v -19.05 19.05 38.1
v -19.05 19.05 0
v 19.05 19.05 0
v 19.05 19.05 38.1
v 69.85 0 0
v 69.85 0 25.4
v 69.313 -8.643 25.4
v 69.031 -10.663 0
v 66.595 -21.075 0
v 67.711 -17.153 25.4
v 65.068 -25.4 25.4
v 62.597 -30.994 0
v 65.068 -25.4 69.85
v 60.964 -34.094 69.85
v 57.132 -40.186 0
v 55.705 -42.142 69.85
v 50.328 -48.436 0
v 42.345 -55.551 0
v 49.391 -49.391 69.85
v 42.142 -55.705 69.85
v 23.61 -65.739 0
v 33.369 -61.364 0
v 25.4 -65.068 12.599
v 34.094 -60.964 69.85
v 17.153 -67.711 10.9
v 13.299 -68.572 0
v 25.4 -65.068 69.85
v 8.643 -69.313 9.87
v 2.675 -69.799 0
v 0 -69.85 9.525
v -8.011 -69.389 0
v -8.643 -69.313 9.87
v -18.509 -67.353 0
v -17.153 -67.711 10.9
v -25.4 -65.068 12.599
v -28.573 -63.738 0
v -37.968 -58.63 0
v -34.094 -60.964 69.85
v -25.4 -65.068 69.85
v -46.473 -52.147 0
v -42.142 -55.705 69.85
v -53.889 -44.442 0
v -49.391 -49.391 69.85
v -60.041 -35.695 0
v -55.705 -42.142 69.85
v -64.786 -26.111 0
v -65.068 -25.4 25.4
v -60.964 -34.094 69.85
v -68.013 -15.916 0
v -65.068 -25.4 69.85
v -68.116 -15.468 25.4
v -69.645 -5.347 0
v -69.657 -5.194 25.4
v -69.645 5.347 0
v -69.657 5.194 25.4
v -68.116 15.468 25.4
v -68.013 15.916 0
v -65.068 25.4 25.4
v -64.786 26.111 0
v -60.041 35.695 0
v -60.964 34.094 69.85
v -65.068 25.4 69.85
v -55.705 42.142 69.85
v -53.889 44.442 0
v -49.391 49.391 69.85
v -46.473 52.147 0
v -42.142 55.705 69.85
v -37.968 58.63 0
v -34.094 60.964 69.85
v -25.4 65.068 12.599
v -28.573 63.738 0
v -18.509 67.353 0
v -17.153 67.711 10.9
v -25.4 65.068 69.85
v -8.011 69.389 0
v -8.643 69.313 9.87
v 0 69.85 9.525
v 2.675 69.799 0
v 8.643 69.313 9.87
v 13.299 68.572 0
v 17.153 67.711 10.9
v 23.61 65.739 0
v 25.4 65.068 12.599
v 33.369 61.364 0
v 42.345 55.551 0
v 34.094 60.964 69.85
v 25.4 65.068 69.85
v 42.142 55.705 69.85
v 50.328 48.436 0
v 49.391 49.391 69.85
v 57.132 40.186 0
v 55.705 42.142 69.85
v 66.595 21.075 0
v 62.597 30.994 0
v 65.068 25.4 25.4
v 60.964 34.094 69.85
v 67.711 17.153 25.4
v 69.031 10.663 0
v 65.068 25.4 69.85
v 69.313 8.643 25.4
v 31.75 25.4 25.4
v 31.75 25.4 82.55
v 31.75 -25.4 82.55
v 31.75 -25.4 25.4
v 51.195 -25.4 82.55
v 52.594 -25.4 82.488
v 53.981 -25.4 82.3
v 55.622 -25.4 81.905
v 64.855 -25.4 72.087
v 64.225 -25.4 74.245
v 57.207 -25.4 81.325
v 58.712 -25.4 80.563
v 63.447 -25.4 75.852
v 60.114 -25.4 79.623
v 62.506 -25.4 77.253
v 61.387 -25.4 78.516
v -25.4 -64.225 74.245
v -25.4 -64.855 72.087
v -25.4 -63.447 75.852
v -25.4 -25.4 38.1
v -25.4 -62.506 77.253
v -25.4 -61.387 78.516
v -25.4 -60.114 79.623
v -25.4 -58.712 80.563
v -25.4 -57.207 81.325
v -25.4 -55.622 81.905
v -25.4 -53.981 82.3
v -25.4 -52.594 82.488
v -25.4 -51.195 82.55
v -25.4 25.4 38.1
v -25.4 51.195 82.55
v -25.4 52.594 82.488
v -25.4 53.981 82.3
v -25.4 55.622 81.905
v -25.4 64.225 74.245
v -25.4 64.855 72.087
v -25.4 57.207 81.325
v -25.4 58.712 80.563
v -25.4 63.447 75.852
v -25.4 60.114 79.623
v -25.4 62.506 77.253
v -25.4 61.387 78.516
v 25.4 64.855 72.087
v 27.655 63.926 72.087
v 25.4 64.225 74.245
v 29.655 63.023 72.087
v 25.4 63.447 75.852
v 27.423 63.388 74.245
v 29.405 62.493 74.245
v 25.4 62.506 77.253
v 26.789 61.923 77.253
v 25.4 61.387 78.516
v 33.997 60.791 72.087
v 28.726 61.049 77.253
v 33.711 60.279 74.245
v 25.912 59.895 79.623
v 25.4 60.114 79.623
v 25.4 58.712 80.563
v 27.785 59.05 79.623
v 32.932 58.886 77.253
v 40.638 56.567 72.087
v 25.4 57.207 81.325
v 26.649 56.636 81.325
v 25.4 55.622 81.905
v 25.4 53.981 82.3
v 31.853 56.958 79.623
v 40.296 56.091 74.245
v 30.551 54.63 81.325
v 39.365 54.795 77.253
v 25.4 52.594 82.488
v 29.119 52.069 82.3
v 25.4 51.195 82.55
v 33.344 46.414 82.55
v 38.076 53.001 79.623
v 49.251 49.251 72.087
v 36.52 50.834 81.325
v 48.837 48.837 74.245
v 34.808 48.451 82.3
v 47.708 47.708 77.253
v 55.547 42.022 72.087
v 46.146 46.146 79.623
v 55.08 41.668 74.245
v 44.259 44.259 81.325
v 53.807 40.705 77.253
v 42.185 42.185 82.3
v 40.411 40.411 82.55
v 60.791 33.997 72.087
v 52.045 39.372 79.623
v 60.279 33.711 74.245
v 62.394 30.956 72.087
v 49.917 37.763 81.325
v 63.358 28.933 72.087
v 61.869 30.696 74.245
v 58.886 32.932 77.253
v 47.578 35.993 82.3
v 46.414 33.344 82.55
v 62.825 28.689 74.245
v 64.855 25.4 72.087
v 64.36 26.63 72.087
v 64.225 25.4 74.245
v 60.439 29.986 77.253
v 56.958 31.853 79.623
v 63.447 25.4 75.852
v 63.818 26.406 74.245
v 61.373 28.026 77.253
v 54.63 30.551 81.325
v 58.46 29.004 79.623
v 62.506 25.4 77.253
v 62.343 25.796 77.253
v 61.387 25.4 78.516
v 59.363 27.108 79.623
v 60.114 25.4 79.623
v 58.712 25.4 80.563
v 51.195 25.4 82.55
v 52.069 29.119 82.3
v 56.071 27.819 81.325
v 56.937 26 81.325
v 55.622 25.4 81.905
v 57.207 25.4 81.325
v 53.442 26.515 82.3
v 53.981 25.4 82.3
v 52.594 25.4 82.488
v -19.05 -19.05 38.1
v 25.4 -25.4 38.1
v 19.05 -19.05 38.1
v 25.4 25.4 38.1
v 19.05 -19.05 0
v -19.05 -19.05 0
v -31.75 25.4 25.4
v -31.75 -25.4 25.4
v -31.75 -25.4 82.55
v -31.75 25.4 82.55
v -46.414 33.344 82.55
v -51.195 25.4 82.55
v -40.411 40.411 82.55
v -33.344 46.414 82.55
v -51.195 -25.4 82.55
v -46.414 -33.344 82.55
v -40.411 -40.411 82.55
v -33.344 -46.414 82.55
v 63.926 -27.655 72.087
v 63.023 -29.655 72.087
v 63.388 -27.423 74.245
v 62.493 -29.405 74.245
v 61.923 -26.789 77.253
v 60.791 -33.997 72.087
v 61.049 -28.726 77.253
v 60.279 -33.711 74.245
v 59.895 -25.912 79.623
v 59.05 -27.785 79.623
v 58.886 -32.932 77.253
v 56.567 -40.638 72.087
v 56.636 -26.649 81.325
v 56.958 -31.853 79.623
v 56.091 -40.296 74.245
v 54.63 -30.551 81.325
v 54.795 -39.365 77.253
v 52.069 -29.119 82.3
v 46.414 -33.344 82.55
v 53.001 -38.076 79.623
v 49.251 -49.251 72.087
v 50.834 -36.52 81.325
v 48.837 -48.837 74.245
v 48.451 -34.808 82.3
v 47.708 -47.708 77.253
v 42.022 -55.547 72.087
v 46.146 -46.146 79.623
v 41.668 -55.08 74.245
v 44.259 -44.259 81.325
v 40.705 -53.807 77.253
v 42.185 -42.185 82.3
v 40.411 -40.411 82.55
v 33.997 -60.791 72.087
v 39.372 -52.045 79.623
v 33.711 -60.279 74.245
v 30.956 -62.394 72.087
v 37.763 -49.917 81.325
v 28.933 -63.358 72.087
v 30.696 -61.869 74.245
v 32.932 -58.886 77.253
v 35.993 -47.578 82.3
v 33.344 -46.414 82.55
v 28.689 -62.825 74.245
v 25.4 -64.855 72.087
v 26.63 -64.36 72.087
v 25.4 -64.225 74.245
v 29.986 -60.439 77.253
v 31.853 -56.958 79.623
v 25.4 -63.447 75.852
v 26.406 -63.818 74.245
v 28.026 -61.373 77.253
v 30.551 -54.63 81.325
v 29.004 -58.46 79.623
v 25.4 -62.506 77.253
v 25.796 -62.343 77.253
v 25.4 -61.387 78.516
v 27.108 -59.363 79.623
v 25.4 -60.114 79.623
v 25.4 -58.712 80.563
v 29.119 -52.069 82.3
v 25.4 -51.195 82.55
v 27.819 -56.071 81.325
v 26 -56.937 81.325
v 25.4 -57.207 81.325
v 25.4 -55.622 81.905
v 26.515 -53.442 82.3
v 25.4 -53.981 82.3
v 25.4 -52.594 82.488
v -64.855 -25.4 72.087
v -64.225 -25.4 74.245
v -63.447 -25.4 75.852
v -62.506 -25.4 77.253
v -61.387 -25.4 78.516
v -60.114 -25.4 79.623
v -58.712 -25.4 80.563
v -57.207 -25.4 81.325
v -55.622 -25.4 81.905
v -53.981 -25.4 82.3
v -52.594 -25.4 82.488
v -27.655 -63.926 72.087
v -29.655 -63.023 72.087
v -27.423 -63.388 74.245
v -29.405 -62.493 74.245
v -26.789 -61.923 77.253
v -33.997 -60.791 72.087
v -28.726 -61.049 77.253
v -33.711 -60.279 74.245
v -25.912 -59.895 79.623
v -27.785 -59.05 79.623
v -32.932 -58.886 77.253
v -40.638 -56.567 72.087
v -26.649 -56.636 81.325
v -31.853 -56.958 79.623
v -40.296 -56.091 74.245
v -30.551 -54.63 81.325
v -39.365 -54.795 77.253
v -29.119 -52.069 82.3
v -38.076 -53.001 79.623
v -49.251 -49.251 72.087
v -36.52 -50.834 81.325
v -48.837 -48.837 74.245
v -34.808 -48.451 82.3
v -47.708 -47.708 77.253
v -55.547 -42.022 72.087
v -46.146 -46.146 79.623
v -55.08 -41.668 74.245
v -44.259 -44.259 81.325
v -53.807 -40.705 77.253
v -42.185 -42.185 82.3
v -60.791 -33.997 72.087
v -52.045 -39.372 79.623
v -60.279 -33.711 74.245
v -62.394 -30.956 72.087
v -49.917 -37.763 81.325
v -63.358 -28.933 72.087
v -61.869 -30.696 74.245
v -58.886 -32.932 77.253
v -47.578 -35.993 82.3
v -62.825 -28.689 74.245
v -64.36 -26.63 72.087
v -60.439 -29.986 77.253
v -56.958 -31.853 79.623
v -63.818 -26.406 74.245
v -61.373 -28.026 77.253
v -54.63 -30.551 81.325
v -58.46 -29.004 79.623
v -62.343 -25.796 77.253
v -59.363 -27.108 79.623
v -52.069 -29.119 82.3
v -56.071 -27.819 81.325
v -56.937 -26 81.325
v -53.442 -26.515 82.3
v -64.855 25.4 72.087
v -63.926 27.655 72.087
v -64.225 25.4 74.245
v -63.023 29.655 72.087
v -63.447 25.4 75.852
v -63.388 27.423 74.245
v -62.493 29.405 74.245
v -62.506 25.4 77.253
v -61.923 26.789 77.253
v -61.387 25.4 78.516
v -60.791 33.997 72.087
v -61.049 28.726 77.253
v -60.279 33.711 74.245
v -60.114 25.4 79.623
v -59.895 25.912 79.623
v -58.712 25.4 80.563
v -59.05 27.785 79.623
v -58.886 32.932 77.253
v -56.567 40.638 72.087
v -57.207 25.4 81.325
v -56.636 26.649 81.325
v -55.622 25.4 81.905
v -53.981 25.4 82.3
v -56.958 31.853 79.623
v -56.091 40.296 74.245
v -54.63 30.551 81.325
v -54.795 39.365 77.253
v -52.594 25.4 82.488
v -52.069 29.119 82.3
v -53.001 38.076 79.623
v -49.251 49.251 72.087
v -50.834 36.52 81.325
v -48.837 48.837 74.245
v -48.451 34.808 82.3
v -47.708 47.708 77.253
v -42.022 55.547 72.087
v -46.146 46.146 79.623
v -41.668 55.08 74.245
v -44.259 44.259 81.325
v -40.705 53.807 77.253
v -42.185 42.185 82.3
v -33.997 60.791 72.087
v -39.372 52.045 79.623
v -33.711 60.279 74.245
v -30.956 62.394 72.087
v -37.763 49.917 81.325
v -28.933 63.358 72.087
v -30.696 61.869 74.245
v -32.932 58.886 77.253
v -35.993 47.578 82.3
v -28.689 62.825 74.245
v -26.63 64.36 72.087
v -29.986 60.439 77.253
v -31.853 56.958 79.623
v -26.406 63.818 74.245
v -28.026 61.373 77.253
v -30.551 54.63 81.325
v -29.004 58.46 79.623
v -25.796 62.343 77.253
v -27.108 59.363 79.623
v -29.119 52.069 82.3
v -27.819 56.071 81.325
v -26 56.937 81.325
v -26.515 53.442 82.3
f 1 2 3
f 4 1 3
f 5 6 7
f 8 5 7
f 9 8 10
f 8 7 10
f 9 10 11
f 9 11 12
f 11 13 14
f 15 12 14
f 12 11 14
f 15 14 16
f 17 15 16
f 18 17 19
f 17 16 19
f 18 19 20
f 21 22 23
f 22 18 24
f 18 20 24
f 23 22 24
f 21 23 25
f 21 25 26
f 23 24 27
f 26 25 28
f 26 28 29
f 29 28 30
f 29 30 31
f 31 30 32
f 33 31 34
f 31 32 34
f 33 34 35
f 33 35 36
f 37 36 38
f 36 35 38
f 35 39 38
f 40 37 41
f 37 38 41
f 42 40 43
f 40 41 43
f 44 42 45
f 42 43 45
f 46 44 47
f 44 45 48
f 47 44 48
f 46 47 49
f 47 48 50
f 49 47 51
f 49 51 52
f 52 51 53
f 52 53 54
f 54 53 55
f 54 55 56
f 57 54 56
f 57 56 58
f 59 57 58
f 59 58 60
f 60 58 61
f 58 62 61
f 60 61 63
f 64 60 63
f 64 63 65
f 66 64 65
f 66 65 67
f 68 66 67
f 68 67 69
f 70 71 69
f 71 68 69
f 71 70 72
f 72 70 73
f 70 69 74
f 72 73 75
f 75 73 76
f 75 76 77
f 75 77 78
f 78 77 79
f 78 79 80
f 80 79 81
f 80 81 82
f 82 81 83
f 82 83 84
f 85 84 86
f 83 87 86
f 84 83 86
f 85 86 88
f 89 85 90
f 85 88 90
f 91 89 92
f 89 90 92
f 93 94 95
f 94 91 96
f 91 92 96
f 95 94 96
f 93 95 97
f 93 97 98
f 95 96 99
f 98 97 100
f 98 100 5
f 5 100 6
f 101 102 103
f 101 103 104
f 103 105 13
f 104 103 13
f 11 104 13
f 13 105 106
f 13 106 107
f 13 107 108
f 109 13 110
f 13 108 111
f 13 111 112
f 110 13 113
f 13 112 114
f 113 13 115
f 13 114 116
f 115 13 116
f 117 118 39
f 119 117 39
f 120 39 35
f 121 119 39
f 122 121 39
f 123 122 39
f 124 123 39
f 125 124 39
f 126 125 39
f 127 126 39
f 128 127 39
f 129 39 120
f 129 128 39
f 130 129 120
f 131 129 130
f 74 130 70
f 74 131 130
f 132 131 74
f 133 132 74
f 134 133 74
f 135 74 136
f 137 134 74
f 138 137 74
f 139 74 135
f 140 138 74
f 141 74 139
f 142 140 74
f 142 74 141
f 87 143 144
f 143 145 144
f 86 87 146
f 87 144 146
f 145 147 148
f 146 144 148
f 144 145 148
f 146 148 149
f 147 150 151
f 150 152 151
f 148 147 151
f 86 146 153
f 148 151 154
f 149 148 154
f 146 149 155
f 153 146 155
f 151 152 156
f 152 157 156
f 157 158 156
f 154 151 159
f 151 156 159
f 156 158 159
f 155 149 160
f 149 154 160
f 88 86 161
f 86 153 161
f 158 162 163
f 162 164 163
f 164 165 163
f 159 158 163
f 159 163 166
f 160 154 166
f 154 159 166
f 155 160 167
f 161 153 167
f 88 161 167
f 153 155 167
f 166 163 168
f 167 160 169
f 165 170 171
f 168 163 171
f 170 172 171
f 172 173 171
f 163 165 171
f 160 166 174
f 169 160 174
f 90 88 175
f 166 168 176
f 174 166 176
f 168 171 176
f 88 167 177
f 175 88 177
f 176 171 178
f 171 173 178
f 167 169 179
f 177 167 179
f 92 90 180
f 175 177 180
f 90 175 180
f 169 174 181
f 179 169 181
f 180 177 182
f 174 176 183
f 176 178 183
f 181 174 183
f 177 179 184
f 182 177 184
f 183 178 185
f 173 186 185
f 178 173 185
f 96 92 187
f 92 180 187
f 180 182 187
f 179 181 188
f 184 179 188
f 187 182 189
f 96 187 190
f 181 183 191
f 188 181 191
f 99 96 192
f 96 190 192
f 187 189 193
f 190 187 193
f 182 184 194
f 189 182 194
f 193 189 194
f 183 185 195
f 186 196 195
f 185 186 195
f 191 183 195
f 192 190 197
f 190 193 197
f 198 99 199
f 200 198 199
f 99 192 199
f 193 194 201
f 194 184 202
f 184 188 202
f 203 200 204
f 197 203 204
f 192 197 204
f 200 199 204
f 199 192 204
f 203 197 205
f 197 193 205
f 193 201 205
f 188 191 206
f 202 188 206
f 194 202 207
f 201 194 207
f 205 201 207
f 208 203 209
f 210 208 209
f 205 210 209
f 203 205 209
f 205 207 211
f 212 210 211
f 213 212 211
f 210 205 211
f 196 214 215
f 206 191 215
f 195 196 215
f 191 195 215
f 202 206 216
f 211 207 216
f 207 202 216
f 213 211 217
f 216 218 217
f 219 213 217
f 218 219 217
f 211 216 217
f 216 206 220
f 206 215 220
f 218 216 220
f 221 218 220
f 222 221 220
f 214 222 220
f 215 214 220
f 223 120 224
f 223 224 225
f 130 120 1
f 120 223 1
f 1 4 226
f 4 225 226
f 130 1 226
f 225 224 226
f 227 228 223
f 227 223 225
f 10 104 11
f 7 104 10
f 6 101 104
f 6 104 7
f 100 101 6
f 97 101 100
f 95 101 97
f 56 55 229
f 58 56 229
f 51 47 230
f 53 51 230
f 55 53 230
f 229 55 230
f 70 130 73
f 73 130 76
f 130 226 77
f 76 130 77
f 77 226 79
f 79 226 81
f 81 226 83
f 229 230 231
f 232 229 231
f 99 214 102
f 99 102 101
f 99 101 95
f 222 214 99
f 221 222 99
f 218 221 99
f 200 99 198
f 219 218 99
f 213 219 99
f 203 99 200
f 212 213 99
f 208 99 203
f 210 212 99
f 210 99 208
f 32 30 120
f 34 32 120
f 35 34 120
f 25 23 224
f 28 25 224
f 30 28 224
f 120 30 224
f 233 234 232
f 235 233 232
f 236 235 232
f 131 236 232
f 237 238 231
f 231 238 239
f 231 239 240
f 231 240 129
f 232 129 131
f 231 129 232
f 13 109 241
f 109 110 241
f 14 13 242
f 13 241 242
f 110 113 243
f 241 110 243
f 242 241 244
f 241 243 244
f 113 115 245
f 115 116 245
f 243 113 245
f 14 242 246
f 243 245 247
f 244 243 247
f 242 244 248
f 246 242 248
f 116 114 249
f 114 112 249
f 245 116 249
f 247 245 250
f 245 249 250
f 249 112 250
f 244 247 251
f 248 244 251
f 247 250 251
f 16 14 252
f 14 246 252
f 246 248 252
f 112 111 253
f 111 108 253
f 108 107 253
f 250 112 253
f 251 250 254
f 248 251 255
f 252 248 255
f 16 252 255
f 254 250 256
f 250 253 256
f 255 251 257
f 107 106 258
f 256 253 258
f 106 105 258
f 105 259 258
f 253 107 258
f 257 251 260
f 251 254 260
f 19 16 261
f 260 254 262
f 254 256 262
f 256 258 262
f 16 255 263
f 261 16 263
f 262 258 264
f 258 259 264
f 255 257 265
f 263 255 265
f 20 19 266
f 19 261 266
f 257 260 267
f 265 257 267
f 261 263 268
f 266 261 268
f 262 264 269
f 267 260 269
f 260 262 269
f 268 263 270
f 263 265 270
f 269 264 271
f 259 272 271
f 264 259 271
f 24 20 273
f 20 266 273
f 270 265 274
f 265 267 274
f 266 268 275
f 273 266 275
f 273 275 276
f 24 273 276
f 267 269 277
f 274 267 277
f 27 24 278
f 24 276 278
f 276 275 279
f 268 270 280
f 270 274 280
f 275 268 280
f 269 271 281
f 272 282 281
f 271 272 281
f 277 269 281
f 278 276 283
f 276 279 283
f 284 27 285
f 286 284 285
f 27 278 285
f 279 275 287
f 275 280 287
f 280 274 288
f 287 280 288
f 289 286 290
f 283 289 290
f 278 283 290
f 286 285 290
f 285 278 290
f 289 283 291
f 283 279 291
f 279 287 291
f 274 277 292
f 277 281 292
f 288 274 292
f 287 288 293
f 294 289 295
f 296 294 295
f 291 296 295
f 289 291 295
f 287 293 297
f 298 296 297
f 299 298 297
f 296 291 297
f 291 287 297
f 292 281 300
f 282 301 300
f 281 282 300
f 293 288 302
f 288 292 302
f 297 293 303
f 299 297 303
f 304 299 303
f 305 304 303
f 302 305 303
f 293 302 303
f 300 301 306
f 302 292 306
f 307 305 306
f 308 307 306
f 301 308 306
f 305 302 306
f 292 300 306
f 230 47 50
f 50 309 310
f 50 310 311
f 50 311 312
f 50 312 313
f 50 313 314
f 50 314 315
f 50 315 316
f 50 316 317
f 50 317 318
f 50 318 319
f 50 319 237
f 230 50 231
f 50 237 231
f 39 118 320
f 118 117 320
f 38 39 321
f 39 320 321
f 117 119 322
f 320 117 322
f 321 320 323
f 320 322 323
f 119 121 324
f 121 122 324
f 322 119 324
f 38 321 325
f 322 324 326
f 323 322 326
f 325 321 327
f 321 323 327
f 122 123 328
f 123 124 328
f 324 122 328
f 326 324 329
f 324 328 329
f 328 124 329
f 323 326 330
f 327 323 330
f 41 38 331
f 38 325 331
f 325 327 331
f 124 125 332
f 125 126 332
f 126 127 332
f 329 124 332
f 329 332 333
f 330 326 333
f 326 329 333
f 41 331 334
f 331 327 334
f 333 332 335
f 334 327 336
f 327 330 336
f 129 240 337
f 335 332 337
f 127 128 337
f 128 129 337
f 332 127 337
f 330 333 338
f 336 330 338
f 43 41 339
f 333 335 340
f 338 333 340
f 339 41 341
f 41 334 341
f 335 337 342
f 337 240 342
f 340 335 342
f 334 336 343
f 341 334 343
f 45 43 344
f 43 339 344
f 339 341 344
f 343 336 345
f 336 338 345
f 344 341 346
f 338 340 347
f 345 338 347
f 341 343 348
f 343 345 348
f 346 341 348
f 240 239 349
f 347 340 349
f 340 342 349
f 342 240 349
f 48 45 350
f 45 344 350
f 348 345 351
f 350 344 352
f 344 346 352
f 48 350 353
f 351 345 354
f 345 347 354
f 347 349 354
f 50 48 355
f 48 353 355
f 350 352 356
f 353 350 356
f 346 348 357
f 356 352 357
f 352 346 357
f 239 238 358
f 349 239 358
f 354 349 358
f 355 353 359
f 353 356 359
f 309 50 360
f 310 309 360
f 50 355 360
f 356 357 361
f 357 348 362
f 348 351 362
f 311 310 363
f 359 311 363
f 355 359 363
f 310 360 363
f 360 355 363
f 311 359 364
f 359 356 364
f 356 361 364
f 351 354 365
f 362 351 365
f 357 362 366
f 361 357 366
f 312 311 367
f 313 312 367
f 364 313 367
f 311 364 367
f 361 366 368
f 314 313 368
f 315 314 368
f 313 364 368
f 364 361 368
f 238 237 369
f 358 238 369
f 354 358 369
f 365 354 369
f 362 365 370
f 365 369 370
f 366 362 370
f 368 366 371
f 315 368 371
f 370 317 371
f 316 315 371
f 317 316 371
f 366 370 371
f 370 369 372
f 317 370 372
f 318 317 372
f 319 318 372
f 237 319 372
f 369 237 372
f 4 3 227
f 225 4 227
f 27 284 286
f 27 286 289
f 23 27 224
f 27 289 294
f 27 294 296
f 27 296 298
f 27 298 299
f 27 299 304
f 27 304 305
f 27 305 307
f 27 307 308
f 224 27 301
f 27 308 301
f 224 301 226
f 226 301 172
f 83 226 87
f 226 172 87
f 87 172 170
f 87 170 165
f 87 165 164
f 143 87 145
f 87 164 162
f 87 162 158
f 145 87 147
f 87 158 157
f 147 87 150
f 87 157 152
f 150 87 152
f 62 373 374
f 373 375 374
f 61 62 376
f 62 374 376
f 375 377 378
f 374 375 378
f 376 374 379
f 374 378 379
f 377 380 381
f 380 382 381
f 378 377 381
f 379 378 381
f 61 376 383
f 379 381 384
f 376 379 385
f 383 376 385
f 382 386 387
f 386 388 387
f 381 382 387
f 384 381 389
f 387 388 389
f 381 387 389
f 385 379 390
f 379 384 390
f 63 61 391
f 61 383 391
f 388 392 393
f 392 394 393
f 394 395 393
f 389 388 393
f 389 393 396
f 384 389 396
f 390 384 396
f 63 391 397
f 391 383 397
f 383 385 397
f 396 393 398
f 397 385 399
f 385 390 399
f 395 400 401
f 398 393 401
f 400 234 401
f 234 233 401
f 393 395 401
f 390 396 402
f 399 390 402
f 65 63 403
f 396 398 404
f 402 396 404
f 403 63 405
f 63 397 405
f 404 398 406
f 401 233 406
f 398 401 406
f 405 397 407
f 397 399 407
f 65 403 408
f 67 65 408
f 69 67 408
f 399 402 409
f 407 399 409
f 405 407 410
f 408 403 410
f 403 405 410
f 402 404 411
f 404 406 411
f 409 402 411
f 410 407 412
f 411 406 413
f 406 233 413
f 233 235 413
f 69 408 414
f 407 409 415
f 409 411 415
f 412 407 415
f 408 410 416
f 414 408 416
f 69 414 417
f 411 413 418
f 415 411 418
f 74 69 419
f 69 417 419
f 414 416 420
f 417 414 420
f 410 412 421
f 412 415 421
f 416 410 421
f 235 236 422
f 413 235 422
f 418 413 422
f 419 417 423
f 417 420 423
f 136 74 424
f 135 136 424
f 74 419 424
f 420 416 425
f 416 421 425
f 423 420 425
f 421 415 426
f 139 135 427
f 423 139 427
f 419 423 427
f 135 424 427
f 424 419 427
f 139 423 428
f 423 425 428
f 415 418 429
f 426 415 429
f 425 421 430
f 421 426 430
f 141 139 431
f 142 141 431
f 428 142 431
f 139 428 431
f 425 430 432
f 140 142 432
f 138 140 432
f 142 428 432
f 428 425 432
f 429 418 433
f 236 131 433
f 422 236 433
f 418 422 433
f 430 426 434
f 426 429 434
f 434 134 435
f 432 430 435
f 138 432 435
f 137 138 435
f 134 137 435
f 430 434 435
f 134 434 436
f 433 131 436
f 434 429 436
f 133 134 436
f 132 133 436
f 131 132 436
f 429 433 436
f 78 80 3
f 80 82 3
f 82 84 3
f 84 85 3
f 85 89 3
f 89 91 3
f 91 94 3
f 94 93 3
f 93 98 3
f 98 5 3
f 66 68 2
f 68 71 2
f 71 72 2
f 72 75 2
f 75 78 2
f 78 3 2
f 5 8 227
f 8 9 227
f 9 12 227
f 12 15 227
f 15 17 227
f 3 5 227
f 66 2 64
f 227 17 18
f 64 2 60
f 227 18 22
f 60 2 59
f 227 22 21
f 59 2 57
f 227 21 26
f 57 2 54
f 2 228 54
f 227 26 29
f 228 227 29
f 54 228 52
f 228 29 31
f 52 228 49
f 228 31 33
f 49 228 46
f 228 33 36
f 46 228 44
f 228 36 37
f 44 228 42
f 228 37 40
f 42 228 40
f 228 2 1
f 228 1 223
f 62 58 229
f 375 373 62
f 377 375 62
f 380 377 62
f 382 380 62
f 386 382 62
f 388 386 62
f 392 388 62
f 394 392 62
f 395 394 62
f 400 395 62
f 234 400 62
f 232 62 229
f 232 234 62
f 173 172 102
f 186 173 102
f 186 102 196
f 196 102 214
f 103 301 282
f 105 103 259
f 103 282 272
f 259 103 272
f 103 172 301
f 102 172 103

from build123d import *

# Parameters (mm, degrees)
F0_W     = 38.1
F0_H     = 57.15
F2_DEPTH = 25.4
F4_DEPTH = 25.4
F5_W     = 38.1
F5_H     = 38.1
F6_DEPTH = 82.5510001


with BuildPart() as f1:
    # F0 (on Front) → F1 (revolve)
    with BuildSketch(Plane.XZ):
        with BuildLine():
            Line((31.75, 25.4), (69.85, 25.4))
            Line((69.85, 25.4), (69.85, 69.85))
            ThreePointArc((69.85, 69.85), (66.1302561211, 78.8302561211), (57.15, 82.55))
            Line((57.15, 82.55), (31.75, 82.55))
            Line((31.75, 82.55), (31.75, 25.4))
        make_face()
        Polygon((0, 0), (38.1, 0), (69.85, 0), (69.85, 25.4), (31.75, 25.4), (31.75, 82.55), (0, 82.55), align=None)
    revolve(axis=Axis((0, 0, 41.275), (0, 0, -1)))

    # F0 (on Front) → F2 (cut, symmetric)
    with BuildSketch(Plane.XZ):
        with BuildLine():
            Line((31.75, 25.4), (69.85, 25.4))
            Line((69.85, 25.4), (69.85, 69.85))
            ThreePointArc((69.85, 69.85), (66.1302561211, 78.8302561211), (57.15, 82.55))
            Line((57.15, 82.55), (31.75, 82.55))
            Line((31.75, 82.55), (31.75, 25.4))
        make_face()
        with Locations((-50.8, 53.975)):
            Rectangle(F0_W, F0_H)
    extrude(amount=F2_DEPTH, both=True, mode=Mode.SUBTRACT)

    # F3 (on Right) → F4 (cut, symmetric)
    with BuildSketch(Plane.YZ):
        Polygon((69.85, 9.525), (69.85, 82.55), (-69.85, 82.55), (-69.85, 9.525), (-25.4, 38.1), (25.4, 38.1), align=None)
    extrude(amount=F4_DEPTH, both=True, mode=Mode.SUBTRACT)

    # F5 (on face) → F6 (cut, through all)
    with BuildSketch(Plane(origin=(0, 0, 0), x_dir=(1, 0, 0), z_dir=(0, 0, -1))):
        Rectangle(F5_W, F5_H)
    extrude(amount=-F6_DEPTH, mode=Mode.SUBTRACT)


solid = f1.part
